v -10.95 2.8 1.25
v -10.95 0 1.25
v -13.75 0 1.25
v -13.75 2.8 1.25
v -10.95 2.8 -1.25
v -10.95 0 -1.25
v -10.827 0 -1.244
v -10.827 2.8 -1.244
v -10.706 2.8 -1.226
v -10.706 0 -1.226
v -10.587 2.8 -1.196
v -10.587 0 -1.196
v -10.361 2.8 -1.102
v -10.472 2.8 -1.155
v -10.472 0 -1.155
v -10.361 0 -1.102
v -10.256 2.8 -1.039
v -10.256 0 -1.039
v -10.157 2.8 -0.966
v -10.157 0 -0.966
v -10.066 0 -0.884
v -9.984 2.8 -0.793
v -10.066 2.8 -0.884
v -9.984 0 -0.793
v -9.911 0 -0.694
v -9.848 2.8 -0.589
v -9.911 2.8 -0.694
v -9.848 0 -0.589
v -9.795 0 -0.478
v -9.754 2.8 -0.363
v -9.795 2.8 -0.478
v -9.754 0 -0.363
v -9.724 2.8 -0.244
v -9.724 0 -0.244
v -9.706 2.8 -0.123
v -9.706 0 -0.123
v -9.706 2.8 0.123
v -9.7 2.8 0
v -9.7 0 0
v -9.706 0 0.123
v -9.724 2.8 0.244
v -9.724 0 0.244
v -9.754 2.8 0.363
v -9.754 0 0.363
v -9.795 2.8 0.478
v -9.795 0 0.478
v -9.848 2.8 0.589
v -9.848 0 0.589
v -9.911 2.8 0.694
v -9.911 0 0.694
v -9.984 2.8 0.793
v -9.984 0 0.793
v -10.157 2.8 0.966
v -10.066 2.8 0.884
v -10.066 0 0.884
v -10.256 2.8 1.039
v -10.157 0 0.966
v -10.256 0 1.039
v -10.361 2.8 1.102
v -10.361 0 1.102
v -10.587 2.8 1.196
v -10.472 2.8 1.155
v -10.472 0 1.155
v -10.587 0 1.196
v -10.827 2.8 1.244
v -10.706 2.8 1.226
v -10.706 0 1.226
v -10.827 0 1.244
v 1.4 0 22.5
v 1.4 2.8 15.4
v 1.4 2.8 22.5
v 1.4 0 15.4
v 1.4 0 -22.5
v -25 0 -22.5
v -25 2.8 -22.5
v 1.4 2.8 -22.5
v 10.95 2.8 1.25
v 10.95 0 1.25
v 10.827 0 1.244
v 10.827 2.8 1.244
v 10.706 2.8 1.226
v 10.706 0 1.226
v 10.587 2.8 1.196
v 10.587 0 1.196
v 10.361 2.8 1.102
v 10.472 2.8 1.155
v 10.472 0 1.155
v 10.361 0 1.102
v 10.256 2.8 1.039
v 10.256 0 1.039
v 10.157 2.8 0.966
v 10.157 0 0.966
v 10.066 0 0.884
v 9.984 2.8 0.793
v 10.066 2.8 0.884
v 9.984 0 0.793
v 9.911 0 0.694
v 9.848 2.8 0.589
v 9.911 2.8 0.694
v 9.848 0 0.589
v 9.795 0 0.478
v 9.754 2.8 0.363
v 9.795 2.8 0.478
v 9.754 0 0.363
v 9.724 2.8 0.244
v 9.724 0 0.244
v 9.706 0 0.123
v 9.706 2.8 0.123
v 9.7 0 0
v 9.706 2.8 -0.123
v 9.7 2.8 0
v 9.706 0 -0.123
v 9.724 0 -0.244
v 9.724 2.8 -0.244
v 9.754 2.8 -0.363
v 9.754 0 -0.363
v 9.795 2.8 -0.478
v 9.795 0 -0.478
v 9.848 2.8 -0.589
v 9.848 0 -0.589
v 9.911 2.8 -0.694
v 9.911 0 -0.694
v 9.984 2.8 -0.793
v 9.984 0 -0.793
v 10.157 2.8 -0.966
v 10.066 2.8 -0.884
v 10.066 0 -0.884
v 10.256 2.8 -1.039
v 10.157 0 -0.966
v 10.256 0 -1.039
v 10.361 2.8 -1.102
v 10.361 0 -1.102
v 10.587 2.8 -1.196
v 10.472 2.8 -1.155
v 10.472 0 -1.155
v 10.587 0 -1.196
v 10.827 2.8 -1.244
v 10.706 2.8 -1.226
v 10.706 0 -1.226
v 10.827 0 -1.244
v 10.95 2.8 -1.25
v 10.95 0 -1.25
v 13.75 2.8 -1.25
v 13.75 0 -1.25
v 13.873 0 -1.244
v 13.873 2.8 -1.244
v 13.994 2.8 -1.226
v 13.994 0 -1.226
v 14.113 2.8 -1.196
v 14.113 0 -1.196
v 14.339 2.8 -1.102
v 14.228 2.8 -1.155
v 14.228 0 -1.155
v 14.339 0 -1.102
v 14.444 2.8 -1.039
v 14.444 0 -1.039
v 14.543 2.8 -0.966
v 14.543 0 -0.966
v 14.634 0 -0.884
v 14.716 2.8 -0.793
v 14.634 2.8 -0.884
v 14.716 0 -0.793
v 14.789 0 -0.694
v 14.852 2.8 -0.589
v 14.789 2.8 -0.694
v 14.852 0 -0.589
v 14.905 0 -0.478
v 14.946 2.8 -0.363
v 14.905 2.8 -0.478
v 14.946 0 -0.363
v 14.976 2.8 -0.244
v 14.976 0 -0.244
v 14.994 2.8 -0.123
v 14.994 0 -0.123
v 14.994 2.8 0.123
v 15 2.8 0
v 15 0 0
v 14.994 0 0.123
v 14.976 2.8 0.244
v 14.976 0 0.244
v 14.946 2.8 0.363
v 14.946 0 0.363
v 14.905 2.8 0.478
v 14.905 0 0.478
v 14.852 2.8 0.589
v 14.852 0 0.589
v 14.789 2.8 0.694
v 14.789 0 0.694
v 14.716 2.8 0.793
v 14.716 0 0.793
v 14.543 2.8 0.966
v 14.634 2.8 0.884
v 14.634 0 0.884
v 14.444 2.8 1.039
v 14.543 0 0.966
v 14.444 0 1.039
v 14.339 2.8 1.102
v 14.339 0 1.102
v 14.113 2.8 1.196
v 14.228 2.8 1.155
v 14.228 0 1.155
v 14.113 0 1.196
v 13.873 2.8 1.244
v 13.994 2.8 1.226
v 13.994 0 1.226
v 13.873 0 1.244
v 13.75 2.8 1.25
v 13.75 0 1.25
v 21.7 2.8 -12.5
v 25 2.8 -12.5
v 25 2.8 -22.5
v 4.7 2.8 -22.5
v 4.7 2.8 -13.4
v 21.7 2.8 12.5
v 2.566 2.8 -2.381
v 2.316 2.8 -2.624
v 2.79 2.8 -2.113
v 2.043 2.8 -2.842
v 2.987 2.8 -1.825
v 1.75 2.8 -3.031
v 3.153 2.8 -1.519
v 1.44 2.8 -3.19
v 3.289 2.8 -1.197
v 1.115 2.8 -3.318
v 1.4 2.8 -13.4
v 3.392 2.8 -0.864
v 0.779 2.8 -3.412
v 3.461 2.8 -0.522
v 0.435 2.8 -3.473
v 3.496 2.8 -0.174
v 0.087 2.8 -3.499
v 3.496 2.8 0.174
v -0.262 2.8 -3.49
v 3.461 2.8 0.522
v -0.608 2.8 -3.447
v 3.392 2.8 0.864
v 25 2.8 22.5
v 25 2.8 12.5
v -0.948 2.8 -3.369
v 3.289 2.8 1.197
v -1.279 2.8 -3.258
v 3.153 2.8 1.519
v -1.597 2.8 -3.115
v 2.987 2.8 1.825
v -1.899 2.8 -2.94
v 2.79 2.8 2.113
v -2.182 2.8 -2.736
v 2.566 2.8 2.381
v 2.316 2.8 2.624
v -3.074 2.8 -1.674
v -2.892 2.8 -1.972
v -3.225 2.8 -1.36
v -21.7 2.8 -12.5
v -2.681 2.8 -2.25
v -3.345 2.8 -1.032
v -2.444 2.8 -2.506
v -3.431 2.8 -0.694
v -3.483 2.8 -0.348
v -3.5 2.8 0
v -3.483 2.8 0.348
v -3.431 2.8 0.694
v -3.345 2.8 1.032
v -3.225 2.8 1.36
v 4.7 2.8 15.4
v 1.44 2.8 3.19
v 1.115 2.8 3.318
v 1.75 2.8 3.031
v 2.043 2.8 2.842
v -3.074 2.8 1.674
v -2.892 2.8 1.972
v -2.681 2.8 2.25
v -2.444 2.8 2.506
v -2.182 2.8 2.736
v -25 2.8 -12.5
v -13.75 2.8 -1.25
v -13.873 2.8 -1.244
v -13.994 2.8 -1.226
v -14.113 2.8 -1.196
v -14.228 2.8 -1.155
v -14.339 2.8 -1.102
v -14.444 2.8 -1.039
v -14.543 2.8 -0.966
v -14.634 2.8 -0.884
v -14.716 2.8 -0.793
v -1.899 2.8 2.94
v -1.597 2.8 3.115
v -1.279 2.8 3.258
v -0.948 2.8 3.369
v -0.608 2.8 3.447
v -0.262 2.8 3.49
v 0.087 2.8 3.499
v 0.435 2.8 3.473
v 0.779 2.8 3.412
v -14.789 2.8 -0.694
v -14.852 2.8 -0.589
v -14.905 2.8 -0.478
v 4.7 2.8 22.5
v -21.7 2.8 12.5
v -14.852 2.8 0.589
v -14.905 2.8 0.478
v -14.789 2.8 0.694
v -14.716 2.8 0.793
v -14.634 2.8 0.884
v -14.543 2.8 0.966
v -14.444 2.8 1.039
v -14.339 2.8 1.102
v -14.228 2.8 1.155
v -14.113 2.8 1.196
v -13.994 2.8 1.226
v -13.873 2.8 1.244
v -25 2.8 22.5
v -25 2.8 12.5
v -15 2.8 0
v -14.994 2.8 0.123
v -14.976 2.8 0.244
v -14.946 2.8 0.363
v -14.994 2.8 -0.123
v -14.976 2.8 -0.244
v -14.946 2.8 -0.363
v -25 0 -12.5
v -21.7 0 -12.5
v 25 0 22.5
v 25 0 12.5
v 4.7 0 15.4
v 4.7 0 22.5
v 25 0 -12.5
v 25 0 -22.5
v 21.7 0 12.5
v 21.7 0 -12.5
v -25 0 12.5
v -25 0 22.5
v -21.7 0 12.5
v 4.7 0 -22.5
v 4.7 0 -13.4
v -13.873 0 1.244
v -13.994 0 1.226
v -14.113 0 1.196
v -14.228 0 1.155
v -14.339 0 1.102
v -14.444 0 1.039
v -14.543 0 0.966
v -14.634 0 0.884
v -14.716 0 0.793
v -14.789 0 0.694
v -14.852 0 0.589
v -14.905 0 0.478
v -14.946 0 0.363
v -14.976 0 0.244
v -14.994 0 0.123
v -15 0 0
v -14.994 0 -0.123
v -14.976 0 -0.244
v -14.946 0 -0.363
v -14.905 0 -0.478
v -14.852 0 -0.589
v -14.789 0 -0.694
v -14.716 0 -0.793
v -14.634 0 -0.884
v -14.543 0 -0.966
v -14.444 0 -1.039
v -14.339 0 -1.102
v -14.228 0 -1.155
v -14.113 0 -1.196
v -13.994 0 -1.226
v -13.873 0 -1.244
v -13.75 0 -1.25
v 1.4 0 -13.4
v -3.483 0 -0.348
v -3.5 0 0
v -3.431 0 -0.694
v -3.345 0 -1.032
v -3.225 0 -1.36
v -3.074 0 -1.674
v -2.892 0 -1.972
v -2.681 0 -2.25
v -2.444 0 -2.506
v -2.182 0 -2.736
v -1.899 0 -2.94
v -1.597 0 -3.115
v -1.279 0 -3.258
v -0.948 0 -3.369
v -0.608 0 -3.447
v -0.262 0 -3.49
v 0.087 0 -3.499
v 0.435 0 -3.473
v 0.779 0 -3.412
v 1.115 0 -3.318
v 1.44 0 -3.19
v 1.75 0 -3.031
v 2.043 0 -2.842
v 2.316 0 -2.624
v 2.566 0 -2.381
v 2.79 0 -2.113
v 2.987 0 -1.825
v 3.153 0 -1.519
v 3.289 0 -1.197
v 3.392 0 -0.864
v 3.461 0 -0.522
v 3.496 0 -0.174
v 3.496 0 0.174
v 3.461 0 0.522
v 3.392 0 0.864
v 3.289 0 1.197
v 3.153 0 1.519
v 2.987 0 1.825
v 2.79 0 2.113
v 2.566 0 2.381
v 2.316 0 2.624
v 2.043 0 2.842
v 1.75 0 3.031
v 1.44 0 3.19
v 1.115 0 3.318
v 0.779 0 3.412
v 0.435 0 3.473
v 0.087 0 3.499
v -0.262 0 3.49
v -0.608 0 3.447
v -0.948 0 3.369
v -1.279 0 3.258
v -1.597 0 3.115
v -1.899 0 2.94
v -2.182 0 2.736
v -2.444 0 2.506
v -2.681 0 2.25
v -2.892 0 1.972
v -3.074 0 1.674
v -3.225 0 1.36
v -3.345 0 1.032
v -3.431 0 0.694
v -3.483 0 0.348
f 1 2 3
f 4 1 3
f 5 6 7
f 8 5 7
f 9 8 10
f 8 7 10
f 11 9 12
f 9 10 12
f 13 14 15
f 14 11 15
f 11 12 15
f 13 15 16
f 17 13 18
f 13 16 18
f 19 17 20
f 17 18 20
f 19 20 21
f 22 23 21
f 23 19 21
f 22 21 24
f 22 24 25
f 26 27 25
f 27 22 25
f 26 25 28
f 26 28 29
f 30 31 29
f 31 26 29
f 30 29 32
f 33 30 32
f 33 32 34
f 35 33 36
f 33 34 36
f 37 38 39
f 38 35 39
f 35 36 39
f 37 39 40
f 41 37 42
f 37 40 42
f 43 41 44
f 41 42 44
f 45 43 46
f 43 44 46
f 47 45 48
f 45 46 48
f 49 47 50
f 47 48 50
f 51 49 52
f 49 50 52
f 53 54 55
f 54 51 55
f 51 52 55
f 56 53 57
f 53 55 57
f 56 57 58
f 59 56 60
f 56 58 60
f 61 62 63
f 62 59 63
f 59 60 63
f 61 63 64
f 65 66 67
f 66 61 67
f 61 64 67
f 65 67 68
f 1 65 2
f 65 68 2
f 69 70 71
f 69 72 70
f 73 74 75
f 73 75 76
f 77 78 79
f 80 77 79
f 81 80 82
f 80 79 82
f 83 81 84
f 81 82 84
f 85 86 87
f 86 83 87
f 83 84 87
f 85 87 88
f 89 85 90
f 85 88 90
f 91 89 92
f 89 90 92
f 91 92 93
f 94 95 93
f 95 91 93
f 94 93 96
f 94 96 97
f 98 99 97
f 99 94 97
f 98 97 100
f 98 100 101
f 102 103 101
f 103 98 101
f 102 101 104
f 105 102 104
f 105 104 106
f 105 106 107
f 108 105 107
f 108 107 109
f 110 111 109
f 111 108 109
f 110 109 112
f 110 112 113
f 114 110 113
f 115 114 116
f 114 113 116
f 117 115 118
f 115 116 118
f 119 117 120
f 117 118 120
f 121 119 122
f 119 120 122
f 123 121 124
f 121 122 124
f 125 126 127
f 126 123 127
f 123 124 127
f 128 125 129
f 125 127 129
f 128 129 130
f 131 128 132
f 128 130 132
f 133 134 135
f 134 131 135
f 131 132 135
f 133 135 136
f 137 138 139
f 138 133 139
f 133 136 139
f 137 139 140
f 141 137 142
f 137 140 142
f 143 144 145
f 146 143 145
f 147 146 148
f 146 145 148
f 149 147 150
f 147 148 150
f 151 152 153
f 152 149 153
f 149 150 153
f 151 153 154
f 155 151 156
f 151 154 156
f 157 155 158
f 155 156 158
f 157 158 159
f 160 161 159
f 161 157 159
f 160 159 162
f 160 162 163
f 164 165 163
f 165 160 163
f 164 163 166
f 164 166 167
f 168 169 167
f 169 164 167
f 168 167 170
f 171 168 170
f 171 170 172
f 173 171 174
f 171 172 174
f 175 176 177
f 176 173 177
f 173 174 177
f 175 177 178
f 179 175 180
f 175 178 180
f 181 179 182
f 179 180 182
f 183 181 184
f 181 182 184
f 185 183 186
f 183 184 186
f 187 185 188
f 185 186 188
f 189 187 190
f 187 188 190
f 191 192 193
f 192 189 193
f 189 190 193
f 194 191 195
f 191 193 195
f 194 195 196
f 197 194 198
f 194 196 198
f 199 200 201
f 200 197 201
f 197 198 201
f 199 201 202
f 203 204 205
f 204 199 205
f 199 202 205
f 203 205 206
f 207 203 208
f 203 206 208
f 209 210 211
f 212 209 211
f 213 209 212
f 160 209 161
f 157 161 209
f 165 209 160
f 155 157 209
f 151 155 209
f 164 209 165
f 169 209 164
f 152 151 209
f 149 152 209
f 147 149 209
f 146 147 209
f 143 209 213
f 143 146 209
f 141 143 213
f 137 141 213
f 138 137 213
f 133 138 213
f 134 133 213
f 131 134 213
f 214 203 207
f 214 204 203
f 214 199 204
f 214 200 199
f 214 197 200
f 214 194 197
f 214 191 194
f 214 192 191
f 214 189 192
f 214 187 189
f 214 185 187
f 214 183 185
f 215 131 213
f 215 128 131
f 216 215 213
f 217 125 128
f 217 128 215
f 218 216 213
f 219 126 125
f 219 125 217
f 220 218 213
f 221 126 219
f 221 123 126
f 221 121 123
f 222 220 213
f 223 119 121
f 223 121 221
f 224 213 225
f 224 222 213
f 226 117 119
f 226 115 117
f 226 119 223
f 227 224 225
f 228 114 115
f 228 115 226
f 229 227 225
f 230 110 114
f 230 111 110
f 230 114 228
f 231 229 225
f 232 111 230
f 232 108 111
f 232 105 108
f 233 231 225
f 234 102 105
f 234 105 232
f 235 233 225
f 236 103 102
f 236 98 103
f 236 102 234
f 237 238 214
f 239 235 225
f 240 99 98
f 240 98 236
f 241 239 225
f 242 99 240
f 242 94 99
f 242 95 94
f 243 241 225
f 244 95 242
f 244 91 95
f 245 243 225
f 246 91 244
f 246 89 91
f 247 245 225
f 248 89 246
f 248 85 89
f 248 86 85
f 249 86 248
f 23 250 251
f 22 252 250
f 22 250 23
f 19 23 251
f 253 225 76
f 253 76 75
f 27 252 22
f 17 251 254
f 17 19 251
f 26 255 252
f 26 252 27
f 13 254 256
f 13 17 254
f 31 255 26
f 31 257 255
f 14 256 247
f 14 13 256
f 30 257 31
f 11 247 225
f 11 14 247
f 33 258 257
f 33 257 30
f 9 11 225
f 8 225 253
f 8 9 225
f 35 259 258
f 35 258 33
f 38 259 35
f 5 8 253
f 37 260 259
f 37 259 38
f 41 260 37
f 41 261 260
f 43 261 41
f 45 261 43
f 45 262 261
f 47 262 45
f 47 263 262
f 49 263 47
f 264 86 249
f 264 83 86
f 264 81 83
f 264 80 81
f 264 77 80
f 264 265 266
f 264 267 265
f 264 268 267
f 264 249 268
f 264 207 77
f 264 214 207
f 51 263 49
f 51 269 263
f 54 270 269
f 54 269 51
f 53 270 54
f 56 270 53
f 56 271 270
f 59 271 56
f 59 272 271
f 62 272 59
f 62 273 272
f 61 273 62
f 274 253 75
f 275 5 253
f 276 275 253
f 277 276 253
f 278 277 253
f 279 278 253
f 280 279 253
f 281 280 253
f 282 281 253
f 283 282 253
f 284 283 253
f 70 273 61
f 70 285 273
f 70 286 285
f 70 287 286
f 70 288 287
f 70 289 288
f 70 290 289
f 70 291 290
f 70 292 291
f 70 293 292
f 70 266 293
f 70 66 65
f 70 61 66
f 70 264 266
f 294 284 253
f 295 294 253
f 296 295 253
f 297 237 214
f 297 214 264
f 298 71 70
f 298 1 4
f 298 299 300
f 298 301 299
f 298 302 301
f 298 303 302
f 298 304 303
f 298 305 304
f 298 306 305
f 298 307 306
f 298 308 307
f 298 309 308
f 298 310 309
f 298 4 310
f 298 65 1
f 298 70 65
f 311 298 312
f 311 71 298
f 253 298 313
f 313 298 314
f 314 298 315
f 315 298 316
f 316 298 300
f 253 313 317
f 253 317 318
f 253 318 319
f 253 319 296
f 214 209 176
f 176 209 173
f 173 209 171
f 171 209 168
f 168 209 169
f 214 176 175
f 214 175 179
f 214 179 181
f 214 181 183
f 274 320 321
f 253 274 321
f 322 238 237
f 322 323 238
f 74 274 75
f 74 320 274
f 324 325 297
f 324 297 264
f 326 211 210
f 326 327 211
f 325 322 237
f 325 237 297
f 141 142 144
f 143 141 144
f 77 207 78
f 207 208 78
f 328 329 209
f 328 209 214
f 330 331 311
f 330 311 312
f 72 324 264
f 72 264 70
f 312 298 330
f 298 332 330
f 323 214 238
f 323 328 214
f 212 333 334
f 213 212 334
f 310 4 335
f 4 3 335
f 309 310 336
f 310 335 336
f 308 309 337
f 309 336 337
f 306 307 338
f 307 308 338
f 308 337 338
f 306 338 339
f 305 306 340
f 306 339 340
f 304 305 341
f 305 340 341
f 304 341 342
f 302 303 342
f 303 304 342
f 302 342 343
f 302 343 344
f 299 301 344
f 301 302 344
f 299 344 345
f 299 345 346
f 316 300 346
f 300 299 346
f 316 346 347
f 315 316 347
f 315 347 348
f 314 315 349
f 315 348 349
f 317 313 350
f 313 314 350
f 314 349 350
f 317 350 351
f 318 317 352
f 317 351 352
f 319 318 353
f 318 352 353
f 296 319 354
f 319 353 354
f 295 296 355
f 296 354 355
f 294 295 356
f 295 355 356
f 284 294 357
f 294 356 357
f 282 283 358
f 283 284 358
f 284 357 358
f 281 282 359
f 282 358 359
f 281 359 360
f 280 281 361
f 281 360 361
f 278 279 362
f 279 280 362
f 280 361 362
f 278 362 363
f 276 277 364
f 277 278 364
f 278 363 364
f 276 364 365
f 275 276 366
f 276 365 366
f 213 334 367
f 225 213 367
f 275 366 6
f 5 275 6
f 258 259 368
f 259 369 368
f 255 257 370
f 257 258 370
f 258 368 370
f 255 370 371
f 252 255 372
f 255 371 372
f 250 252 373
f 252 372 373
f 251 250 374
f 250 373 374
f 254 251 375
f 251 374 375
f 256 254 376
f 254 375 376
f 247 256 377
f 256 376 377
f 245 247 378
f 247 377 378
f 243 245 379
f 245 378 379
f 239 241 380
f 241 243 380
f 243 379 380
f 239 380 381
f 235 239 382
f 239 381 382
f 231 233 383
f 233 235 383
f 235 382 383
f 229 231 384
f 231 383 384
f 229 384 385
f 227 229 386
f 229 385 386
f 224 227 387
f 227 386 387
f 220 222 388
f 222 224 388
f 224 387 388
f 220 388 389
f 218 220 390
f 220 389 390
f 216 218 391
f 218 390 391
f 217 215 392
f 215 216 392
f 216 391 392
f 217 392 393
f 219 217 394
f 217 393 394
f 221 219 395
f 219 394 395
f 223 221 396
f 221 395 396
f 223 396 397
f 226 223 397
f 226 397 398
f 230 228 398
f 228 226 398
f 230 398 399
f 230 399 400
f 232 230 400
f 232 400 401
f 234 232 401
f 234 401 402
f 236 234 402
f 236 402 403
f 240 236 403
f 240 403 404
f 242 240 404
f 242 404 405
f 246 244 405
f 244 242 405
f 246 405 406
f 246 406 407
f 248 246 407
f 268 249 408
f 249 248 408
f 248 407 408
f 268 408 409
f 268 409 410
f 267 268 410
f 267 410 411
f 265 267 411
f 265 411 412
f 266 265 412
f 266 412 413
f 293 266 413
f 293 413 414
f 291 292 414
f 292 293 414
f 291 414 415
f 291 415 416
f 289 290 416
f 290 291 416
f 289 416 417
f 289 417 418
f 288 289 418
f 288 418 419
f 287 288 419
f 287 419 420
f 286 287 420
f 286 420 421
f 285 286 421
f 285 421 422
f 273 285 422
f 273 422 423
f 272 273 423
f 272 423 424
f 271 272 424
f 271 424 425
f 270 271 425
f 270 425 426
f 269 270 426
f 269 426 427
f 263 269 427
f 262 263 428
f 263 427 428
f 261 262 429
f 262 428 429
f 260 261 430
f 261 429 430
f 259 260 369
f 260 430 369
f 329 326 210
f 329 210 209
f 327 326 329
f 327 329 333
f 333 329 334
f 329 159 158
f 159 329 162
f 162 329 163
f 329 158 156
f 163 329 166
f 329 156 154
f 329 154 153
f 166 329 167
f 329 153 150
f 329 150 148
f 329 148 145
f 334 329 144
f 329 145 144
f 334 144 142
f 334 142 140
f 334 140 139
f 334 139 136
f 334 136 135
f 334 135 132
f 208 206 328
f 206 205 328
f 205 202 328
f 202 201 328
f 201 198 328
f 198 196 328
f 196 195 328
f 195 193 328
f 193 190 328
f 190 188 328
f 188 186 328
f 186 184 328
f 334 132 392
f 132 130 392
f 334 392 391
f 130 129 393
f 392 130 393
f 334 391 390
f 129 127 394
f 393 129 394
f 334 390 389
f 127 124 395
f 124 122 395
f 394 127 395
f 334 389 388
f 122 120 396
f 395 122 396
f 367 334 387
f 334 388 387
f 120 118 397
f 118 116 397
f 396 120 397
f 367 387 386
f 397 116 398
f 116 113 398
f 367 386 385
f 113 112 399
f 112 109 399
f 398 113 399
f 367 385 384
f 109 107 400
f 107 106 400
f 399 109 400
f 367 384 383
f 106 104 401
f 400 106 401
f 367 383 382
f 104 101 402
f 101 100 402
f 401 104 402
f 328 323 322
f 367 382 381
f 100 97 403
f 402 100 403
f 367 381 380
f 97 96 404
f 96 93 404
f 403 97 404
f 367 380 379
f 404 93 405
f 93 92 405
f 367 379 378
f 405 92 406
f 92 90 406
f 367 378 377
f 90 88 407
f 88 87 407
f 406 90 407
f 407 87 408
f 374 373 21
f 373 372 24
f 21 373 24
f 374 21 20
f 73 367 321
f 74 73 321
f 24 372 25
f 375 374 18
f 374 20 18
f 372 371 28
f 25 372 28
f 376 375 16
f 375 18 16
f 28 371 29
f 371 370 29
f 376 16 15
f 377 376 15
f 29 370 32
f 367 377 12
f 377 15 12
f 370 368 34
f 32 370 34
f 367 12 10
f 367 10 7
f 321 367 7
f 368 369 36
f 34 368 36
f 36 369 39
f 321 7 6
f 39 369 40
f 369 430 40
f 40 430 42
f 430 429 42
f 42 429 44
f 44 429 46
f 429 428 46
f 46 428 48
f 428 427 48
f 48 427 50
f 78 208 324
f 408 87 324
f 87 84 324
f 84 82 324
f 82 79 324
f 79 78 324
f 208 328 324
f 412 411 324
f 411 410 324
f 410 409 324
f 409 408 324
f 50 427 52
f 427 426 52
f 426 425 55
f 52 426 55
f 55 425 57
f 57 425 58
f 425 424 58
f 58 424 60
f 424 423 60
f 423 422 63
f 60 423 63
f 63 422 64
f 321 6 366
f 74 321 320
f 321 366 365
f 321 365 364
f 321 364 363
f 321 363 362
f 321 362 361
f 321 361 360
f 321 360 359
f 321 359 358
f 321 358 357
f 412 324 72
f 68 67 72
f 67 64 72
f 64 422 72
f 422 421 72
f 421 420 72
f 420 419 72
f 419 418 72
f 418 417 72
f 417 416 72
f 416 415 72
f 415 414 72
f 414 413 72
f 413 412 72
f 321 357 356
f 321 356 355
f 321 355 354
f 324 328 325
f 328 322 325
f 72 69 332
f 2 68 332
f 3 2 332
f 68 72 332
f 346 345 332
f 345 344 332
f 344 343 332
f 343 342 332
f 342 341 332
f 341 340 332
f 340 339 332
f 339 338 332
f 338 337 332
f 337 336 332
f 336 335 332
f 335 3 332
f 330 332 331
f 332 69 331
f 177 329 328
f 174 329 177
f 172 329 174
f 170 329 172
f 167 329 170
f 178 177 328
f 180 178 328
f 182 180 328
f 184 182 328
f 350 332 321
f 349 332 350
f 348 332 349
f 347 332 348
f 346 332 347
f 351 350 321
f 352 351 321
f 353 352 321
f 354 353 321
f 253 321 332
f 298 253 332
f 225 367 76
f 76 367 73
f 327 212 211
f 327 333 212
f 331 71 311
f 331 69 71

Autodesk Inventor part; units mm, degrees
ref_plane "YZ Plane" through (0, 0, 0) normal (1, 0, 0) x (0, 1, 0)
ref_plane "XZ Plane" through (0, 0, 0) normal (0, 1, 0) x (-1, 0, 0)
ref_plane "XY Plane" through (0, 0, 0) normal (0, 0, 1) x (1, 0, 0)
sketch "Sketch1" plane through (0, 0, 0) normal (0, 1, 0) x (-1, 0, 0)
  line L0 (-25, 22.5) -> (25, 22.5)
  line L1 (25, 22.5) -> (25, -22.5)
  line L2 (25, -22.5) -> (-25, -22.5)
  line L3 (-25, -22.5) -> (-25, 22.5)
  line L4 (-25, 22.5) -> (25, -22.5) construction
  line L5 (25, 22.5) -> (-25, -22.5) construction
  line L6 (25, -12.5) -> (21.7, -12.5)
  line L7 (21.7, -12.5) -> (21.7, 12.5)
  line L8 (21.7, 12.5) -> (25, 12.5)
  line L9 (25, 12.5) -> (25, -12.5)
  line L10 (-25, -12.5) -> (-21.7, -12.5)
  line L11 (-21.7, -12.5) -> (-21.7, 12.5)
  line L12 (-21.7, 12.5) -> (-25, 12.5)
  line L13 (-25, 12.5) -> (-25, -12.5)
  line L14 (-1.4, -22.5) -> (-4.7, -22.5)
  line L15 (-4.7, -22.5) -> (-4.7, -13.4)
  line L16 (-4.7, -13.4) -> (-1.4, -13.4)
  line L17 (-1.4, -13.4) -> (-1.4, -22.5)
  line L18 (-1.4, 22.5) -> (-4.7, 22.5)
  line L19 (-4.7, 22.5) -> (-4.7, 15.4)
  line L20 (-4.7, 15.4) -> (-1.4, 15.4)
  line L21 (-1.4, 15.4) -> (-1.4, 22.5)
  circle A0 centre (0, 0) radius 3.5
  line L22 (15, 0) -> (9.7, 0) construction
  line L23 (13.75, -1.25) -> (10.95, -1.25)
  line L24 (10.95, 1.25) -> (13.75, 1.25)
  arc A1 (13.75, -1.25) -> (13.75, 1.25) centre (13.75, 0) ccw
  arc A2 (10.95, 1.25) -> (10.95, -1.25) centre (10.95, 0) ccw
  line L25 (-9.7, 0) -> (-15, 0) construction
  line L26 (-10.95, -1.25) -> (-13.75, -1.25)
  line L27 (-13.75, 1.25) -> (-10.95, 1.25)
  arc A3 (-10.95, -1.25) -> (-10.95, 1.25) centre (-10.95, 0) ccw
  arc A4 (-13.75, 1.25) -> (-13.75, -1.25) centre (-13.75, 0) ccw
  line L28 (9.7, 0) -> (0, 0) construction
  line L29 (-9.7, 0) -> (0, 0) construction
  point P0 (21.7, 0)
  point P1 (12.35, 0)
  point P2 (-12.35, 0)
  dimension "d0" = 45
  dimension "d1" = 50
  dimension "d2" = 3.3
  dimension "d3" = 25
  dimension "d4" = 9.1
  dimension "d5" = 20.3
  dimension "d6" = 7
  dimension "d7" = 5.3
  dimension "d8" = 2.5
  dimension "d9" = 30
  dimension "d12" = 7.1
extrude "Extrusion1" add sketch "Sketch1" along normal blind 2.8 contours L0 L19 L20 L21 L1 L8 L7 L6 L2 L17 L16 L15 L3 L10 L11 L12
